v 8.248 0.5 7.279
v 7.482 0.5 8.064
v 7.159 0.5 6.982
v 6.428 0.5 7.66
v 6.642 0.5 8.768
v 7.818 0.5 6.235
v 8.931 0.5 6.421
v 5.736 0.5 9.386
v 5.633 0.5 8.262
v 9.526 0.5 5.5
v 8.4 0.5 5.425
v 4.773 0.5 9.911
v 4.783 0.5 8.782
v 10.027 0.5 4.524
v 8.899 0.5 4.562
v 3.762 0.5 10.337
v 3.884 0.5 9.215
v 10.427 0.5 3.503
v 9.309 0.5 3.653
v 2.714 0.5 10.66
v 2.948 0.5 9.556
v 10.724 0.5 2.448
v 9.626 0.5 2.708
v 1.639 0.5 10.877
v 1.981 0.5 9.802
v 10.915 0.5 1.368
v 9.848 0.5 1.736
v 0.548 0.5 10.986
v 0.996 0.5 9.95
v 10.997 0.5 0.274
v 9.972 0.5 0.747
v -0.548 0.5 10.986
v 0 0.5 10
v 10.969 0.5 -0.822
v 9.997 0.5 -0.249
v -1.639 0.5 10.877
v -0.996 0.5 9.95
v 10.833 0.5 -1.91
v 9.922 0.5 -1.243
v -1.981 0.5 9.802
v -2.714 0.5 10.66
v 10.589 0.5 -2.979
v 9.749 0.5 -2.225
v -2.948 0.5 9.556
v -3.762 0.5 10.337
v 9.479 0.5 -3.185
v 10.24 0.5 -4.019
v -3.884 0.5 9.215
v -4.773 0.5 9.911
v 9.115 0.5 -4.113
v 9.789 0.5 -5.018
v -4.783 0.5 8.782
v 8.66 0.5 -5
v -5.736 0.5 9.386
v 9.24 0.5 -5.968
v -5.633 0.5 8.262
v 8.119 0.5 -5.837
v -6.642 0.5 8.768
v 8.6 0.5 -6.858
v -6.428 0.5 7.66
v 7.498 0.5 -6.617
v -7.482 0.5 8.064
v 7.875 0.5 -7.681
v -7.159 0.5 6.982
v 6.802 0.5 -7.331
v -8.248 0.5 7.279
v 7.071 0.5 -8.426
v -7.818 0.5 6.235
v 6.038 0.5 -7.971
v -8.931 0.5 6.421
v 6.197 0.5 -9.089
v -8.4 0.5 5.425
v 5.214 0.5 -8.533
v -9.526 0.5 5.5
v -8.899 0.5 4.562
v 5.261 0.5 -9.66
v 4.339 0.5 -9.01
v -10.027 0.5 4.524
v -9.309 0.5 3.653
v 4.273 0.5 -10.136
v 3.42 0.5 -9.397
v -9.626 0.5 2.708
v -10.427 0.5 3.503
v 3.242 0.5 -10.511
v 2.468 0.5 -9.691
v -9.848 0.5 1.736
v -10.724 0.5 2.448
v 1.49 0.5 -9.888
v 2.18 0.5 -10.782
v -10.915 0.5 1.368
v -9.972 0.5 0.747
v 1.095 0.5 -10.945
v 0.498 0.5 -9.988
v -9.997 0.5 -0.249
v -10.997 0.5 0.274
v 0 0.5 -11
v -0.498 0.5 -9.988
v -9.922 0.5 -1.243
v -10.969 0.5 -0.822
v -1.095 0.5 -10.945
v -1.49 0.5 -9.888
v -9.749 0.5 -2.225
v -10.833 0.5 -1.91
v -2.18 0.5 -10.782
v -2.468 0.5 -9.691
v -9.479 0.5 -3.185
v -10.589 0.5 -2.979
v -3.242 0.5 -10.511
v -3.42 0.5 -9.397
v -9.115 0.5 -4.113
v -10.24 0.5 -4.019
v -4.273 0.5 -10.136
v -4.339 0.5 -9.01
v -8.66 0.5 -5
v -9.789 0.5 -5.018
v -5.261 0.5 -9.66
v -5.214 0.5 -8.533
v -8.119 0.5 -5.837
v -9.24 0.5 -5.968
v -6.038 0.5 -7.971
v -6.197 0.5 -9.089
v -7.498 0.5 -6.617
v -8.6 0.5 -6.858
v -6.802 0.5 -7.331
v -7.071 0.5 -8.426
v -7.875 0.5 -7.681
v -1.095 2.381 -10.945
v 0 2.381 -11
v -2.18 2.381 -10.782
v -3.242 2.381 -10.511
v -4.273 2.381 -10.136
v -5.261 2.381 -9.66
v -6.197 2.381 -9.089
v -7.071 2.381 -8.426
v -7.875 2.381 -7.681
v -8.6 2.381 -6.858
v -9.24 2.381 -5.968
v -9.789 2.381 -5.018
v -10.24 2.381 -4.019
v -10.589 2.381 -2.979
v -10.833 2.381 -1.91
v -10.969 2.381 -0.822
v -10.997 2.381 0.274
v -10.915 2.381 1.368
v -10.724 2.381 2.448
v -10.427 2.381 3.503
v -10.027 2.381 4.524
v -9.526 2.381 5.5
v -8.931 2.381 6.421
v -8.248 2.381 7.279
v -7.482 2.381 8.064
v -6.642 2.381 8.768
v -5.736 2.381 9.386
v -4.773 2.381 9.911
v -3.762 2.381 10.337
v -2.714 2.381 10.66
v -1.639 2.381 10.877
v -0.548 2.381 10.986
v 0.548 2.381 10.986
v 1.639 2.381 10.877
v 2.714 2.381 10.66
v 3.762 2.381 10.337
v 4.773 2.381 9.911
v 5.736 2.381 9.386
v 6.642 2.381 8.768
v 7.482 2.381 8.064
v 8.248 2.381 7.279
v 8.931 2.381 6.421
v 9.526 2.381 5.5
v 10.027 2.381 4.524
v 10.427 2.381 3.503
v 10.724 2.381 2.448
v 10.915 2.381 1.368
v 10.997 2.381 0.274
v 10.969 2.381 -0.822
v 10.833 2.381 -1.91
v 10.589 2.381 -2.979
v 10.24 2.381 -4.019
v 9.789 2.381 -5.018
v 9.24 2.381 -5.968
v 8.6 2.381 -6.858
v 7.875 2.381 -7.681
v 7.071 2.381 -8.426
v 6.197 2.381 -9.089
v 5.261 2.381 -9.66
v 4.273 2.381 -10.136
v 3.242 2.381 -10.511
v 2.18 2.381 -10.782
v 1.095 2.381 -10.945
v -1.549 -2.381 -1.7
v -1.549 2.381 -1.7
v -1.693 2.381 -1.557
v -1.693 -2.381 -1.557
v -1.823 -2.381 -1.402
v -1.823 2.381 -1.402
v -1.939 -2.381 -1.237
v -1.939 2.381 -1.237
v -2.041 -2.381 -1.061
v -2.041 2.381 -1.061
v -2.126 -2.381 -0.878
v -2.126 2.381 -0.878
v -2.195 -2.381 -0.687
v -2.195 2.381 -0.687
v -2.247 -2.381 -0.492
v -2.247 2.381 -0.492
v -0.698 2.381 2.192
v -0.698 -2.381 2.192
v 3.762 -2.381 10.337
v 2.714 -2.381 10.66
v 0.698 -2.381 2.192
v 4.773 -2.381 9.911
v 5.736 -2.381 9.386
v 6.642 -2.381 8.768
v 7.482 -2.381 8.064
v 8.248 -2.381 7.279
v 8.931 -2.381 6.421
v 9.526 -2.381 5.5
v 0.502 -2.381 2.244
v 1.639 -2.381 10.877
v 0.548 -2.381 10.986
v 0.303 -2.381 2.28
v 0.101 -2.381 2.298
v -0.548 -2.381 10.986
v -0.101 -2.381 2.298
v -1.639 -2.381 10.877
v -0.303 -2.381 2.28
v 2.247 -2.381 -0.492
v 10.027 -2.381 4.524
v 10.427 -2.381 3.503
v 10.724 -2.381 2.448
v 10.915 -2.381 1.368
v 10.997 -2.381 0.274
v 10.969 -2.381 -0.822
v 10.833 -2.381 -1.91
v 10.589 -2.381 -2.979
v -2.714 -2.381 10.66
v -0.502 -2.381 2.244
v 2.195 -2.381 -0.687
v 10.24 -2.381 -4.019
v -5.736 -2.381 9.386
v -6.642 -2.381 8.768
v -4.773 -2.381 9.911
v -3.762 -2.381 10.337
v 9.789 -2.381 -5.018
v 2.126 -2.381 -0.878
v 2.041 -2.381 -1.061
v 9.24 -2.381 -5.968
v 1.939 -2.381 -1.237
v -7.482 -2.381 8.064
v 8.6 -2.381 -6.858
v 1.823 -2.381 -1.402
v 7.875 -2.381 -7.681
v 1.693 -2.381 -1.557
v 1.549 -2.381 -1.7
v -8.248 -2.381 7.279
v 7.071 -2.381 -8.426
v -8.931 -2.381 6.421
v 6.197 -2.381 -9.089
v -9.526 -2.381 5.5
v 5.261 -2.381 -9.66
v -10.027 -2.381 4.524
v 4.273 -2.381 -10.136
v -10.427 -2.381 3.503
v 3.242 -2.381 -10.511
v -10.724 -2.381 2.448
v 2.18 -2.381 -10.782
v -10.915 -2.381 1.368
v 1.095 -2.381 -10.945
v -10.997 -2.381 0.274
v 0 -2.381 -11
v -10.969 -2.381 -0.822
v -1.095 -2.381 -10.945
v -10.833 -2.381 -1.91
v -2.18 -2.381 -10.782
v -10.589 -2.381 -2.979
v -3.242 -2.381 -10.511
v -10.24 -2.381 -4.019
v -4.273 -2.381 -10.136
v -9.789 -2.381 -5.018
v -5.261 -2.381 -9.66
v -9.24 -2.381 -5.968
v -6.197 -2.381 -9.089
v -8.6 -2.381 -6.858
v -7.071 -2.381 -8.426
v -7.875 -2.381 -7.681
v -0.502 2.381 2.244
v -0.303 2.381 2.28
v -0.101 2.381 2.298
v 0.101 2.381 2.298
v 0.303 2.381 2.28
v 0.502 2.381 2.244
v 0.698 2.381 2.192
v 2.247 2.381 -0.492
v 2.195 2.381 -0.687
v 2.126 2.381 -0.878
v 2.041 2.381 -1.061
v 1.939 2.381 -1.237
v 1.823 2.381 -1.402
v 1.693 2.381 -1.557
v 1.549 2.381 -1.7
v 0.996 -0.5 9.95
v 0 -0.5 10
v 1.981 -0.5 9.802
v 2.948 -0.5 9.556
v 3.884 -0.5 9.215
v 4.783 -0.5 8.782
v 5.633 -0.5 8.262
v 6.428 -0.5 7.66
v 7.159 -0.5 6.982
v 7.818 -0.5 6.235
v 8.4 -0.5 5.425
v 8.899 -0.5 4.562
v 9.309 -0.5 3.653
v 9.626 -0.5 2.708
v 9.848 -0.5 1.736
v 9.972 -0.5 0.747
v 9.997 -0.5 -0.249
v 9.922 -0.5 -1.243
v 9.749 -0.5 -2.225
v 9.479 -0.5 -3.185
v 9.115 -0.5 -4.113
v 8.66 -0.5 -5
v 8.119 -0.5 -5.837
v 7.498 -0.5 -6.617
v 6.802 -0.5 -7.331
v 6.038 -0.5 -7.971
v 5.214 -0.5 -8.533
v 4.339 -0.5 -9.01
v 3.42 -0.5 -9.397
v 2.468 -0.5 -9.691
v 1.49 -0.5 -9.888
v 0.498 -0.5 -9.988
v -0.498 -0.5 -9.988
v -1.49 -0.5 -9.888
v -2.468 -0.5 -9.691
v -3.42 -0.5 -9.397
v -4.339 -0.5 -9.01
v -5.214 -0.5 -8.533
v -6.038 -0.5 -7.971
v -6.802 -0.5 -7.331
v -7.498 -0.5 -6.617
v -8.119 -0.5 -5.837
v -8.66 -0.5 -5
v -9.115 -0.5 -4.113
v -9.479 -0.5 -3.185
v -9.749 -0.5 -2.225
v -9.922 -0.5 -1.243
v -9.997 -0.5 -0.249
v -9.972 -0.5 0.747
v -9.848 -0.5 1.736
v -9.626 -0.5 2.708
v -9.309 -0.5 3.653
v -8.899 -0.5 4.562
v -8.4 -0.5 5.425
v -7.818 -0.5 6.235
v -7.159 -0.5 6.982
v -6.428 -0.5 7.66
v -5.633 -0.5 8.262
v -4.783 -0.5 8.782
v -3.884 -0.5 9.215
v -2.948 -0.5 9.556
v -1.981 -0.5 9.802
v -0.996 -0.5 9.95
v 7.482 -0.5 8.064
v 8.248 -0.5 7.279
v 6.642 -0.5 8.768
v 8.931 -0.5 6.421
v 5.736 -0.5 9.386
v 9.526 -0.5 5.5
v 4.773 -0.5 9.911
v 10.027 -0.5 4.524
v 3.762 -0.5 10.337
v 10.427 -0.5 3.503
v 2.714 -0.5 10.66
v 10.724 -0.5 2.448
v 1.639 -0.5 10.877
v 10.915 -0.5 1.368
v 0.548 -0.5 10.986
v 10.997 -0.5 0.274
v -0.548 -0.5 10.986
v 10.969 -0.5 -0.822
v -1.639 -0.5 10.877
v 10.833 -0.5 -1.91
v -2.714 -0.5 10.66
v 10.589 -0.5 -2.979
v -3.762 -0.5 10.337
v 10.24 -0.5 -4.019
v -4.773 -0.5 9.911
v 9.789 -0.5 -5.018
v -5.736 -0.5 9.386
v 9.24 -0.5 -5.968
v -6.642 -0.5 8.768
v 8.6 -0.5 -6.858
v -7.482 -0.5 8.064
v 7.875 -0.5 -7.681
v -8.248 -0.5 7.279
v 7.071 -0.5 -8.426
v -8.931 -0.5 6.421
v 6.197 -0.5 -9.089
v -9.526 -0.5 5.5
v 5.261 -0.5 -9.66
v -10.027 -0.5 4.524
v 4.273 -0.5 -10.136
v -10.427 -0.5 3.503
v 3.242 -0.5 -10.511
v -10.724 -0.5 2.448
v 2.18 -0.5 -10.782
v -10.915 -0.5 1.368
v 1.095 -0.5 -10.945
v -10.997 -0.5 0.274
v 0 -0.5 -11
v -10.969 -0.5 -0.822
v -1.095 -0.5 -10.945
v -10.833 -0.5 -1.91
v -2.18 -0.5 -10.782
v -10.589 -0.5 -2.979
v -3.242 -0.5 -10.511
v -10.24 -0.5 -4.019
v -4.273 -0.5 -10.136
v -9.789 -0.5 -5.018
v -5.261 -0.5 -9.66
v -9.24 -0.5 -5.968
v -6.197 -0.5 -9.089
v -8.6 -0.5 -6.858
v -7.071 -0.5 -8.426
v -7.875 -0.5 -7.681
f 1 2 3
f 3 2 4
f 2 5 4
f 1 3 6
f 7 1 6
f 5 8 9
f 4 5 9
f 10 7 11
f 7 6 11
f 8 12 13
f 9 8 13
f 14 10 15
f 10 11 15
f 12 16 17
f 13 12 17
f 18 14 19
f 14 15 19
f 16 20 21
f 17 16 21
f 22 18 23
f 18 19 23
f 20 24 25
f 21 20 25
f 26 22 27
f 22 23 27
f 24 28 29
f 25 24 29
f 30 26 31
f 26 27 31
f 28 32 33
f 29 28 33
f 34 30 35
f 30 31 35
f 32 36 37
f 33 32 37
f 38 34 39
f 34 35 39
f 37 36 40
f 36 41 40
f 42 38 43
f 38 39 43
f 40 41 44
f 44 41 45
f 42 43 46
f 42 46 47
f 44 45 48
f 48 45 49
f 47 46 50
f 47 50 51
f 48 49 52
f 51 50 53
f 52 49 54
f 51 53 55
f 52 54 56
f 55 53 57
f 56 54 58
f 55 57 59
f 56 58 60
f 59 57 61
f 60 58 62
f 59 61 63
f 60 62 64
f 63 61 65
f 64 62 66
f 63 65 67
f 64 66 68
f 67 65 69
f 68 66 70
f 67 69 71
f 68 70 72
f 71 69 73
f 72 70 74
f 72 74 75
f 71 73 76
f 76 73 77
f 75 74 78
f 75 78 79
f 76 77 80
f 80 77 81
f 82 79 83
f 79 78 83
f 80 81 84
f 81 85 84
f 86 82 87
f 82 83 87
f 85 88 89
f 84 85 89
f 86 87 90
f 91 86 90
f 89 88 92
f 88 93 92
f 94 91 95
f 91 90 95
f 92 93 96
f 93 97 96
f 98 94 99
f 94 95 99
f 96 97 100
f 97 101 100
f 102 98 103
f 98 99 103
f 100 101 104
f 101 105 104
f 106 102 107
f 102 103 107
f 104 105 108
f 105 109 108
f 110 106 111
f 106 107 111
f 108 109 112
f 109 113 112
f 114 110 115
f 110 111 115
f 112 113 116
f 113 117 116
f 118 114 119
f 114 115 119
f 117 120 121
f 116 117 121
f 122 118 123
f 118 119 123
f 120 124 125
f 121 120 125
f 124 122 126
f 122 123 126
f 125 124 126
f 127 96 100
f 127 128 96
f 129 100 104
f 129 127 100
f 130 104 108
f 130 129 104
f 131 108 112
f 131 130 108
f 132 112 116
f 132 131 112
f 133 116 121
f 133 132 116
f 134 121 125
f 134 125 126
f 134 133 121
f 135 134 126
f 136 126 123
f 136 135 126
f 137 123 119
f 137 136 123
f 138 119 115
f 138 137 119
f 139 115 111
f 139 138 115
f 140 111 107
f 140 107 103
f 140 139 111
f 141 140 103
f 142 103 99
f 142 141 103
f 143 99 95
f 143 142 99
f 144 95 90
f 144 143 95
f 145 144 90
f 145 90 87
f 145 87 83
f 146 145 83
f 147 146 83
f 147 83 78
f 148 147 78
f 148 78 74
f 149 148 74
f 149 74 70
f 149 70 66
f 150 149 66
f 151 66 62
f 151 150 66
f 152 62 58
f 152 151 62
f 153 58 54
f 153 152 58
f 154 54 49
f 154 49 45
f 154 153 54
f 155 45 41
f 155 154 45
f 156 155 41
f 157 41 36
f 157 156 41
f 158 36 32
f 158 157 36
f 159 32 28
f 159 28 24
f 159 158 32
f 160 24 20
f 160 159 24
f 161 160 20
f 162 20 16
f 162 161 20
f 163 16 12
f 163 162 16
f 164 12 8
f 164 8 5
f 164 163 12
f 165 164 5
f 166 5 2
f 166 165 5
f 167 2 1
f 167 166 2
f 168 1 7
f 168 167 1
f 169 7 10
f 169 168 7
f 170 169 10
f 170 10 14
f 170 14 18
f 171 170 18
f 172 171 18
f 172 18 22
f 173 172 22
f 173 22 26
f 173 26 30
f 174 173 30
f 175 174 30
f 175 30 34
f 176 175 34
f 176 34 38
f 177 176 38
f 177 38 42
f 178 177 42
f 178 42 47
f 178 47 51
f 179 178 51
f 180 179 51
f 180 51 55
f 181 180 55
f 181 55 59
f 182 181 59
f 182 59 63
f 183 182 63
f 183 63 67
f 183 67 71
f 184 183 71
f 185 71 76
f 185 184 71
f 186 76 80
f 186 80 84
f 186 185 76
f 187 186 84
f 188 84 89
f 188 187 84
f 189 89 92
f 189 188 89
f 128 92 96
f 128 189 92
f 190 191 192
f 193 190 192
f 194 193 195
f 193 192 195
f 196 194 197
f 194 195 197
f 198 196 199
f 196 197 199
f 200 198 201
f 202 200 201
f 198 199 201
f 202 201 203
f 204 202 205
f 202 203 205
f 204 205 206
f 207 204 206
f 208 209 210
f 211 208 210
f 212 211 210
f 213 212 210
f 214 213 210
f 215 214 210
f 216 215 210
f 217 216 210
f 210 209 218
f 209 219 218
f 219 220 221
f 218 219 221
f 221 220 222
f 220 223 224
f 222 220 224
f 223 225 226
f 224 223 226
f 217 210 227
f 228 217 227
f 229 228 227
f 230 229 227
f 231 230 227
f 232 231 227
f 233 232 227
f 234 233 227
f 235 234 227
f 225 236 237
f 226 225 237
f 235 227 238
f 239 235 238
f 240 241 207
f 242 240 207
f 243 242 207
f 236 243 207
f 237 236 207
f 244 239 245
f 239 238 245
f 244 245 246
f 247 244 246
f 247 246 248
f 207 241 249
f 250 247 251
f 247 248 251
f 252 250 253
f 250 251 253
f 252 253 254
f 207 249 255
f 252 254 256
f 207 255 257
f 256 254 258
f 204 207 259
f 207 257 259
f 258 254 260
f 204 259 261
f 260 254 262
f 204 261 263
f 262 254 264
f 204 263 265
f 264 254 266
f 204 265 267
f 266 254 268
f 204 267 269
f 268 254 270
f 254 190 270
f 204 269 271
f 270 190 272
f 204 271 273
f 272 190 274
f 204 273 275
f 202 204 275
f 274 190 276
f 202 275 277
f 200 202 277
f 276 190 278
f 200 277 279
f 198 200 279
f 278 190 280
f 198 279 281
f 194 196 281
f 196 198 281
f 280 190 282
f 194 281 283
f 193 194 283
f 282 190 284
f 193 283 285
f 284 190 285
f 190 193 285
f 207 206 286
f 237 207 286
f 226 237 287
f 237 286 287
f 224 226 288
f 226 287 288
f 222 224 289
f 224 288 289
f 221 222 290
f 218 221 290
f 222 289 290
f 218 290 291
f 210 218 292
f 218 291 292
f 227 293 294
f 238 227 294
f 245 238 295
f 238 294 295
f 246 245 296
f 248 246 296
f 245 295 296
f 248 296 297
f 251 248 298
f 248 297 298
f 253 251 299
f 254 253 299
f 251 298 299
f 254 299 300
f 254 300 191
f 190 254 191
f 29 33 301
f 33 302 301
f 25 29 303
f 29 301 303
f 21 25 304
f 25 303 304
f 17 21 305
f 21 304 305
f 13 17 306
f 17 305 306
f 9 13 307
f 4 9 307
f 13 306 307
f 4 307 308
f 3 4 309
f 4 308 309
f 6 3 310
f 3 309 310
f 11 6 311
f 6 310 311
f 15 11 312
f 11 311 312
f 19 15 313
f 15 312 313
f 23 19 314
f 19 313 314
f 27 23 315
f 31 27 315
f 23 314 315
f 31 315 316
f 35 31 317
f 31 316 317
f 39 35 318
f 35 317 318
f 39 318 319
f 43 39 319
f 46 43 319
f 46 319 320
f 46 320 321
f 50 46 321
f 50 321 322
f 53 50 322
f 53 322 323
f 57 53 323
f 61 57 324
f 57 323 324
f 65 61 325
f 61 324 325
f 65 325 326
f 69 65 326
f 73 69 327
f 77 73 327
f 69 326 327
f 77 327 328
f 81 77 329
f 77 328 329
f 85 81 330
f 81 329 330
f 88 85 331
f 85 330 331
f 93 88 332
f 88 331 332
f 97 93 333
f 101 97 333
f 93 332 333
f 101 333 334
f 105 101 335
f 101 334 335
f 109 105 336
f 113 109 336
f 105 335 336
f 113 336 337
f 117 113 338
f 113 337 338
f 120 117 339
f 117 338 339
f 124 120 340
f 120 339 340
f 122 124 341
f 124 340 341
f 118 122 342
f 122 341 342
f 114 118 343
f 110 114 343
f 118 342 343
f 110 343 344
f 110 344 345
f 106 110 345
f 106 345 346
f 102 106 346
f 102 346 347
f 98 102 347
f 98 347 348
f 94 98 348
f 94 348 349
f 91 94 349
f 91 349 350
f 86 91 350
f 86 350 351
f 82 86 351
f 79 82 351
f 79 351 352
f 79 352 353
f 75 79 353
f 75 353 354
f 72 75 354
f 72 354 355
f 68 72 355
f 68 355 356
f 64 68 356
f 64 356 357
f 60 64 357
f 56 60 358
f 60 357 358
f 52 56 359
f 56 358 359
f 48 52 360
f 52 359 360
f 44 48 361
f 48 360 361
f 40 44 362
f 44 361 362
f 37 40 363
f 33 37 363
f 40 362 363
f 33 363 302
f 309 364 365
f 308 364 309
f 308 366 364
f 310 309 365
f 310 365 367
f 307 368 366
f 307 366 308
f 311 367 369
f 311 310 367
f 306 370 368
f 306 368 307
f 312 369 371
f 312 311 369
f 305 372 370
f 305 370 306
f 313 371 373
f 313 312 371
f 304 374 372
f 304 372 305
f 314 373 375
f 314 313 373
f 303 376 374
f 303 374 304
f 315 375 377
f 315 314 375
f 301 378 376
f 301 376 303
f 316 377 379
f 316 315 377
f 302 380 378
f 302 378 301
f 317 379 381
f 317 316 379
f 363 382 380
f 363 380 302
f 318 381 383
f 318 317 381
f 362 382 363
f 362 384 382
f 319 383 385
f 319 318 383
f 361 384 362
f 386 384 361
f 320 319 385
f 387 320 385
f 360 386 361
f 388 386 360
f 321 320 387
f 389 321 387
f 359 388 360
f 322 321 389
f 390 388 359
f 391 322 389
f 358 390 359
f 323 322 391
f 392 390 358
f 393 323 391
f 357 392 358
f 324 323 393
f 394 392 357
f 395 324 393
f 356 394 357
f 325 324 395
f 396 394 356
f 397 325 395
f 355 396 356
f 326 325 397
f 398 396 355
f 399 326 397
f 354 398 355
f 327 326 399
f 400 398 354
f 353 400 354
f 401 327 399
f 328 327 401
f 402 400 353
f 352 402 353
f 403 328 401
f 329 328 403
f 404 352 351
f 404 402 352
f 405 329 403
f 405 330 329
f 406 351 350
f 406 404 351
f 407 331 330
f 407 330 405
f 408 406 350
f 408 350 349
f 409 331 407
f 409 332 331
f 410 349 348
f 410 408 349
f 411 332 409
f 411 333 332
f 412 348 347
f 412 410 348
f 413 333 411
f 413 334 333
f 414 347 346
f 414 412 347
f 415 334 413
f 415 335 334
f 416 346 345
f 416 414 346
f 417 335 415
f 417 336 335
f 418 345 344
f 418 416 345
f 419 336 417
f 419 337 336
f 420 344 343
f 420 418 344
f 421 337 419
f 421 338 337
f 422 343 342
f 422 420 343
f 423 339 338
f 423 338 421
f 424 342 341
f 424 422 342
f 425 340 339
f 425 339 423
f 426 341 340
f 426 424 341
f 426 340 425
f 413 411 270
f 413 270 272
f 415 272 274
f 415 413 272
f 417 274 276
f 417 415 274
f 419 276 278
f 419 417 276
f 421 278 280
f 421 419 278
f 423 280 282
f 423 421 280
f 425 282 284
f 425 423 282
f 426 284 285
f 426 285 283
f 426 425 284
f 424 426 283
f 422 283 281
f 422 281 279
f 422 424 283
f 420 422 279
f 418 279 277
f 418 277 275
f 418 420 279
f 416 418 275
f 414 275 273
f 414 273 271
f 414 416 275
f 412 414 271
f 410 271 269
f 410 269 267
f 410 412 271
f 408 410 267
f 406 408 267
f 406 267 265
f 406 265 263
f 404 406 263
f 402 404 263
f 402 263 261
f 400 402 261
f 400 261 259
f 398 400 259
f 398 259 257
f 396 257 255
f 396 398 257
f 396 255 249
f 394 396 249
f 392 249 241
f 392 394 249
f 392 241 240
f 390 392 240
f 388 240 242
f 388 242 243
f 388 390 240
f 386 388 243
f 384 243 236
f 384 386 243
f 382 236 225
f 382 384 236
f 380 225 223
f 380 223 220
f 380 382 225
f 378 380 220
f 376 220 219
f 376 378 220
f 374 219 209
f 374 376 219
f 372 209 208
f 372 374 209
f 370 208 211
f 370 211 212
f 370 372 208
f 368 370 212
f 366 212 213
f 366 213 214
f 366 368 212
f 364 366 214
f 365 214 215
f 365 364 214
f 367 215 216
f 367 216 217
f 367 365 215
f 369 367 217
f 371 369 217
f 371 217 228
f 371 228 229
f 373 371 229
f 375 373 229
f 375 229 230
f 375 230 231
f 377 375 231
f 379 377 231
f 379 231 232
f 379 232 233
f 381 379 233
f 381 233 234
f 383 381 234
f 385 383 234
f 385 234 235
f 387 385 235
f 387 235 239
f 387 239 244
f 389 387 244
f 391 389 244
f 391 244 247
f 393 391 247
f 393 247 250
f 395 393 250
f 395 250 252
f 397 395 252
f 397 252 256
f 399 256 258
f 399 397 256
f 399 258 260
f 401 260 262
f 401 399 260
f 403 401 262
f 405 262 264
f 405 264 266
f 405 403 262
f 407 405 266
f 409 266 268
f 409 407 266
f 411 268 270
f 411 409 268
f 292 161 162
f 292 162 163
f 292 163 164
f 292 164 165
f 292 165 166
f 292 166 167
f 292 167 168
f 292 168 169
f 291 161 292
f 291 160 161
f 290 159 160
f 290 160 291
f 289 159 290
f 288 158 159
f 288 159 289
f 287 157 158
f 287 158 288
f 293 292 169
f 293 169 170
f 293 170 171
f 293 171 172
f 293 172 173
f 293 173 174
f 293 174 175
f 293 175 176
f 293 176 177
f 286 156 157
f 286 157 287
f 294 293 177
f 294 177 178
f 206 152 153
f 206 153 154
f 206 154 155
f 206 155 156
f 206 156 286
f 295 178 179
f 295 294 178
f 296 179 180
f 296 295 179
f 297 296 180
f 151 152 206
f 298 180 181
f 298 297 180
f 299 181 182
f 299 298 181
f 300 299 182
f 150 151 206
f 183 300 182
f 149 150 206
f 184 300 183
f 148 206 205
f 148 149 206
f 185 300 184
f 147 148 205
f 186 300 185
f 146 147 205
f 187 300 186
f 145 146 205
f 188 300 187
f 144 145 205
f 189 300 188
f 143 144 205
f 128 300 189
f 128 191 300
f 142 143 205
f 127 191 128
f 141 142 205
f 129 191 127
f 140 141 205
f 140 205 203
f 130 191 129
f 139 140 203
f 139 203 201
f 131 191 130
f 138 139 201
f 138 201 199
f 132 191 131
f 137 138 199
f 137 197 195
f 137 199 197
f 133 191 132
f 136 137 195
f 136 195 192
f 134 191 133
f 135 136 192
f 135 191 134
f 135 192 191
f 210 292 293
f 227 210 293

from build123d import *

# Parameters (mm, degrees)
ESBO_O1_R                = 11
RESSALTO_EXTRUS_O1_DEPTH = 2.38125
ESBO_O2_R                = 11
ESBO_O2_R_2              = 10
CORTE_EXTRUS_O1_DEPTH    = 0.5
CORTE_EXTRUS_O3_DEPTH    = 17.269032124


with BuildPart() as part:
    # Esboço1 → Ressalto-extrusão1 (new, symmetric)
    with BuildSketch(Plane(origin=(0, 0, 0), x_dir=(1, 0, 0), z_dir=(0, 1, 0))):
        with Locations(Location((0, 0, 0), (0, 0, 90))):
            Circle(ESBO_O1_R)
    extrude(amount=RESSALTO_EXTRUS_O1_DEPTH, both=True)

    # Esboço2 → Corte-extrusão1 (cut, symmetric)
    with BuildSketch(Plane(origin=(0, 0, 0), x_dir=(1, 0, 0), z_dir=(0, 1, 0))):
        with Locations(Location((0, 0, 0), (0, 0, 90))):
            Circle(ESBO_O2_R)
        with Locations(Location((0, 0, 0), (0, 0, 270))):
            Circle(ESBO_O2_R_2, mode=Mode.SUBTRACT)
    extrude(amount=CORTE_EXTRUS_O1_DEPTH, both=True, mode=Mode.SUBTRACT)

    # Esboço4 → Corte-extrusão3 (cut, through all)
    with BuildSketch(Plane(origin=(0, 2.38125, 0), x_dir=(1, 0, 0), z_dir=(0, 1, 0))):
        with BuildLine():
            Line((-2.246839856, 0.491640786), (-0.697646517, -2.191640786))
            ThreePointArc((-0.697646517, -2.191640786), (0, -2.3), (0.697646517, -2.191640786))
            Line((0.697646517, -2.191640786), (2.246839856, 0.491640786))
            ThreePointArc((2.246839856, 0.491640786), (1.991858429, 1.15), (1.549193338, 1.7))
            Line((1.549193338, 1.7), (-1.549193338, 1.7))
            ThreePointArc((-1.549193338, 1.7), (-1.991858429, 1.15), (-2.246839856, 0.491640786))
        make_face()
    extrude(amount=-CORTE_EXTRUS_O3_DEPTH, mode=Mode.SUBTRACT)


solid = part.part
